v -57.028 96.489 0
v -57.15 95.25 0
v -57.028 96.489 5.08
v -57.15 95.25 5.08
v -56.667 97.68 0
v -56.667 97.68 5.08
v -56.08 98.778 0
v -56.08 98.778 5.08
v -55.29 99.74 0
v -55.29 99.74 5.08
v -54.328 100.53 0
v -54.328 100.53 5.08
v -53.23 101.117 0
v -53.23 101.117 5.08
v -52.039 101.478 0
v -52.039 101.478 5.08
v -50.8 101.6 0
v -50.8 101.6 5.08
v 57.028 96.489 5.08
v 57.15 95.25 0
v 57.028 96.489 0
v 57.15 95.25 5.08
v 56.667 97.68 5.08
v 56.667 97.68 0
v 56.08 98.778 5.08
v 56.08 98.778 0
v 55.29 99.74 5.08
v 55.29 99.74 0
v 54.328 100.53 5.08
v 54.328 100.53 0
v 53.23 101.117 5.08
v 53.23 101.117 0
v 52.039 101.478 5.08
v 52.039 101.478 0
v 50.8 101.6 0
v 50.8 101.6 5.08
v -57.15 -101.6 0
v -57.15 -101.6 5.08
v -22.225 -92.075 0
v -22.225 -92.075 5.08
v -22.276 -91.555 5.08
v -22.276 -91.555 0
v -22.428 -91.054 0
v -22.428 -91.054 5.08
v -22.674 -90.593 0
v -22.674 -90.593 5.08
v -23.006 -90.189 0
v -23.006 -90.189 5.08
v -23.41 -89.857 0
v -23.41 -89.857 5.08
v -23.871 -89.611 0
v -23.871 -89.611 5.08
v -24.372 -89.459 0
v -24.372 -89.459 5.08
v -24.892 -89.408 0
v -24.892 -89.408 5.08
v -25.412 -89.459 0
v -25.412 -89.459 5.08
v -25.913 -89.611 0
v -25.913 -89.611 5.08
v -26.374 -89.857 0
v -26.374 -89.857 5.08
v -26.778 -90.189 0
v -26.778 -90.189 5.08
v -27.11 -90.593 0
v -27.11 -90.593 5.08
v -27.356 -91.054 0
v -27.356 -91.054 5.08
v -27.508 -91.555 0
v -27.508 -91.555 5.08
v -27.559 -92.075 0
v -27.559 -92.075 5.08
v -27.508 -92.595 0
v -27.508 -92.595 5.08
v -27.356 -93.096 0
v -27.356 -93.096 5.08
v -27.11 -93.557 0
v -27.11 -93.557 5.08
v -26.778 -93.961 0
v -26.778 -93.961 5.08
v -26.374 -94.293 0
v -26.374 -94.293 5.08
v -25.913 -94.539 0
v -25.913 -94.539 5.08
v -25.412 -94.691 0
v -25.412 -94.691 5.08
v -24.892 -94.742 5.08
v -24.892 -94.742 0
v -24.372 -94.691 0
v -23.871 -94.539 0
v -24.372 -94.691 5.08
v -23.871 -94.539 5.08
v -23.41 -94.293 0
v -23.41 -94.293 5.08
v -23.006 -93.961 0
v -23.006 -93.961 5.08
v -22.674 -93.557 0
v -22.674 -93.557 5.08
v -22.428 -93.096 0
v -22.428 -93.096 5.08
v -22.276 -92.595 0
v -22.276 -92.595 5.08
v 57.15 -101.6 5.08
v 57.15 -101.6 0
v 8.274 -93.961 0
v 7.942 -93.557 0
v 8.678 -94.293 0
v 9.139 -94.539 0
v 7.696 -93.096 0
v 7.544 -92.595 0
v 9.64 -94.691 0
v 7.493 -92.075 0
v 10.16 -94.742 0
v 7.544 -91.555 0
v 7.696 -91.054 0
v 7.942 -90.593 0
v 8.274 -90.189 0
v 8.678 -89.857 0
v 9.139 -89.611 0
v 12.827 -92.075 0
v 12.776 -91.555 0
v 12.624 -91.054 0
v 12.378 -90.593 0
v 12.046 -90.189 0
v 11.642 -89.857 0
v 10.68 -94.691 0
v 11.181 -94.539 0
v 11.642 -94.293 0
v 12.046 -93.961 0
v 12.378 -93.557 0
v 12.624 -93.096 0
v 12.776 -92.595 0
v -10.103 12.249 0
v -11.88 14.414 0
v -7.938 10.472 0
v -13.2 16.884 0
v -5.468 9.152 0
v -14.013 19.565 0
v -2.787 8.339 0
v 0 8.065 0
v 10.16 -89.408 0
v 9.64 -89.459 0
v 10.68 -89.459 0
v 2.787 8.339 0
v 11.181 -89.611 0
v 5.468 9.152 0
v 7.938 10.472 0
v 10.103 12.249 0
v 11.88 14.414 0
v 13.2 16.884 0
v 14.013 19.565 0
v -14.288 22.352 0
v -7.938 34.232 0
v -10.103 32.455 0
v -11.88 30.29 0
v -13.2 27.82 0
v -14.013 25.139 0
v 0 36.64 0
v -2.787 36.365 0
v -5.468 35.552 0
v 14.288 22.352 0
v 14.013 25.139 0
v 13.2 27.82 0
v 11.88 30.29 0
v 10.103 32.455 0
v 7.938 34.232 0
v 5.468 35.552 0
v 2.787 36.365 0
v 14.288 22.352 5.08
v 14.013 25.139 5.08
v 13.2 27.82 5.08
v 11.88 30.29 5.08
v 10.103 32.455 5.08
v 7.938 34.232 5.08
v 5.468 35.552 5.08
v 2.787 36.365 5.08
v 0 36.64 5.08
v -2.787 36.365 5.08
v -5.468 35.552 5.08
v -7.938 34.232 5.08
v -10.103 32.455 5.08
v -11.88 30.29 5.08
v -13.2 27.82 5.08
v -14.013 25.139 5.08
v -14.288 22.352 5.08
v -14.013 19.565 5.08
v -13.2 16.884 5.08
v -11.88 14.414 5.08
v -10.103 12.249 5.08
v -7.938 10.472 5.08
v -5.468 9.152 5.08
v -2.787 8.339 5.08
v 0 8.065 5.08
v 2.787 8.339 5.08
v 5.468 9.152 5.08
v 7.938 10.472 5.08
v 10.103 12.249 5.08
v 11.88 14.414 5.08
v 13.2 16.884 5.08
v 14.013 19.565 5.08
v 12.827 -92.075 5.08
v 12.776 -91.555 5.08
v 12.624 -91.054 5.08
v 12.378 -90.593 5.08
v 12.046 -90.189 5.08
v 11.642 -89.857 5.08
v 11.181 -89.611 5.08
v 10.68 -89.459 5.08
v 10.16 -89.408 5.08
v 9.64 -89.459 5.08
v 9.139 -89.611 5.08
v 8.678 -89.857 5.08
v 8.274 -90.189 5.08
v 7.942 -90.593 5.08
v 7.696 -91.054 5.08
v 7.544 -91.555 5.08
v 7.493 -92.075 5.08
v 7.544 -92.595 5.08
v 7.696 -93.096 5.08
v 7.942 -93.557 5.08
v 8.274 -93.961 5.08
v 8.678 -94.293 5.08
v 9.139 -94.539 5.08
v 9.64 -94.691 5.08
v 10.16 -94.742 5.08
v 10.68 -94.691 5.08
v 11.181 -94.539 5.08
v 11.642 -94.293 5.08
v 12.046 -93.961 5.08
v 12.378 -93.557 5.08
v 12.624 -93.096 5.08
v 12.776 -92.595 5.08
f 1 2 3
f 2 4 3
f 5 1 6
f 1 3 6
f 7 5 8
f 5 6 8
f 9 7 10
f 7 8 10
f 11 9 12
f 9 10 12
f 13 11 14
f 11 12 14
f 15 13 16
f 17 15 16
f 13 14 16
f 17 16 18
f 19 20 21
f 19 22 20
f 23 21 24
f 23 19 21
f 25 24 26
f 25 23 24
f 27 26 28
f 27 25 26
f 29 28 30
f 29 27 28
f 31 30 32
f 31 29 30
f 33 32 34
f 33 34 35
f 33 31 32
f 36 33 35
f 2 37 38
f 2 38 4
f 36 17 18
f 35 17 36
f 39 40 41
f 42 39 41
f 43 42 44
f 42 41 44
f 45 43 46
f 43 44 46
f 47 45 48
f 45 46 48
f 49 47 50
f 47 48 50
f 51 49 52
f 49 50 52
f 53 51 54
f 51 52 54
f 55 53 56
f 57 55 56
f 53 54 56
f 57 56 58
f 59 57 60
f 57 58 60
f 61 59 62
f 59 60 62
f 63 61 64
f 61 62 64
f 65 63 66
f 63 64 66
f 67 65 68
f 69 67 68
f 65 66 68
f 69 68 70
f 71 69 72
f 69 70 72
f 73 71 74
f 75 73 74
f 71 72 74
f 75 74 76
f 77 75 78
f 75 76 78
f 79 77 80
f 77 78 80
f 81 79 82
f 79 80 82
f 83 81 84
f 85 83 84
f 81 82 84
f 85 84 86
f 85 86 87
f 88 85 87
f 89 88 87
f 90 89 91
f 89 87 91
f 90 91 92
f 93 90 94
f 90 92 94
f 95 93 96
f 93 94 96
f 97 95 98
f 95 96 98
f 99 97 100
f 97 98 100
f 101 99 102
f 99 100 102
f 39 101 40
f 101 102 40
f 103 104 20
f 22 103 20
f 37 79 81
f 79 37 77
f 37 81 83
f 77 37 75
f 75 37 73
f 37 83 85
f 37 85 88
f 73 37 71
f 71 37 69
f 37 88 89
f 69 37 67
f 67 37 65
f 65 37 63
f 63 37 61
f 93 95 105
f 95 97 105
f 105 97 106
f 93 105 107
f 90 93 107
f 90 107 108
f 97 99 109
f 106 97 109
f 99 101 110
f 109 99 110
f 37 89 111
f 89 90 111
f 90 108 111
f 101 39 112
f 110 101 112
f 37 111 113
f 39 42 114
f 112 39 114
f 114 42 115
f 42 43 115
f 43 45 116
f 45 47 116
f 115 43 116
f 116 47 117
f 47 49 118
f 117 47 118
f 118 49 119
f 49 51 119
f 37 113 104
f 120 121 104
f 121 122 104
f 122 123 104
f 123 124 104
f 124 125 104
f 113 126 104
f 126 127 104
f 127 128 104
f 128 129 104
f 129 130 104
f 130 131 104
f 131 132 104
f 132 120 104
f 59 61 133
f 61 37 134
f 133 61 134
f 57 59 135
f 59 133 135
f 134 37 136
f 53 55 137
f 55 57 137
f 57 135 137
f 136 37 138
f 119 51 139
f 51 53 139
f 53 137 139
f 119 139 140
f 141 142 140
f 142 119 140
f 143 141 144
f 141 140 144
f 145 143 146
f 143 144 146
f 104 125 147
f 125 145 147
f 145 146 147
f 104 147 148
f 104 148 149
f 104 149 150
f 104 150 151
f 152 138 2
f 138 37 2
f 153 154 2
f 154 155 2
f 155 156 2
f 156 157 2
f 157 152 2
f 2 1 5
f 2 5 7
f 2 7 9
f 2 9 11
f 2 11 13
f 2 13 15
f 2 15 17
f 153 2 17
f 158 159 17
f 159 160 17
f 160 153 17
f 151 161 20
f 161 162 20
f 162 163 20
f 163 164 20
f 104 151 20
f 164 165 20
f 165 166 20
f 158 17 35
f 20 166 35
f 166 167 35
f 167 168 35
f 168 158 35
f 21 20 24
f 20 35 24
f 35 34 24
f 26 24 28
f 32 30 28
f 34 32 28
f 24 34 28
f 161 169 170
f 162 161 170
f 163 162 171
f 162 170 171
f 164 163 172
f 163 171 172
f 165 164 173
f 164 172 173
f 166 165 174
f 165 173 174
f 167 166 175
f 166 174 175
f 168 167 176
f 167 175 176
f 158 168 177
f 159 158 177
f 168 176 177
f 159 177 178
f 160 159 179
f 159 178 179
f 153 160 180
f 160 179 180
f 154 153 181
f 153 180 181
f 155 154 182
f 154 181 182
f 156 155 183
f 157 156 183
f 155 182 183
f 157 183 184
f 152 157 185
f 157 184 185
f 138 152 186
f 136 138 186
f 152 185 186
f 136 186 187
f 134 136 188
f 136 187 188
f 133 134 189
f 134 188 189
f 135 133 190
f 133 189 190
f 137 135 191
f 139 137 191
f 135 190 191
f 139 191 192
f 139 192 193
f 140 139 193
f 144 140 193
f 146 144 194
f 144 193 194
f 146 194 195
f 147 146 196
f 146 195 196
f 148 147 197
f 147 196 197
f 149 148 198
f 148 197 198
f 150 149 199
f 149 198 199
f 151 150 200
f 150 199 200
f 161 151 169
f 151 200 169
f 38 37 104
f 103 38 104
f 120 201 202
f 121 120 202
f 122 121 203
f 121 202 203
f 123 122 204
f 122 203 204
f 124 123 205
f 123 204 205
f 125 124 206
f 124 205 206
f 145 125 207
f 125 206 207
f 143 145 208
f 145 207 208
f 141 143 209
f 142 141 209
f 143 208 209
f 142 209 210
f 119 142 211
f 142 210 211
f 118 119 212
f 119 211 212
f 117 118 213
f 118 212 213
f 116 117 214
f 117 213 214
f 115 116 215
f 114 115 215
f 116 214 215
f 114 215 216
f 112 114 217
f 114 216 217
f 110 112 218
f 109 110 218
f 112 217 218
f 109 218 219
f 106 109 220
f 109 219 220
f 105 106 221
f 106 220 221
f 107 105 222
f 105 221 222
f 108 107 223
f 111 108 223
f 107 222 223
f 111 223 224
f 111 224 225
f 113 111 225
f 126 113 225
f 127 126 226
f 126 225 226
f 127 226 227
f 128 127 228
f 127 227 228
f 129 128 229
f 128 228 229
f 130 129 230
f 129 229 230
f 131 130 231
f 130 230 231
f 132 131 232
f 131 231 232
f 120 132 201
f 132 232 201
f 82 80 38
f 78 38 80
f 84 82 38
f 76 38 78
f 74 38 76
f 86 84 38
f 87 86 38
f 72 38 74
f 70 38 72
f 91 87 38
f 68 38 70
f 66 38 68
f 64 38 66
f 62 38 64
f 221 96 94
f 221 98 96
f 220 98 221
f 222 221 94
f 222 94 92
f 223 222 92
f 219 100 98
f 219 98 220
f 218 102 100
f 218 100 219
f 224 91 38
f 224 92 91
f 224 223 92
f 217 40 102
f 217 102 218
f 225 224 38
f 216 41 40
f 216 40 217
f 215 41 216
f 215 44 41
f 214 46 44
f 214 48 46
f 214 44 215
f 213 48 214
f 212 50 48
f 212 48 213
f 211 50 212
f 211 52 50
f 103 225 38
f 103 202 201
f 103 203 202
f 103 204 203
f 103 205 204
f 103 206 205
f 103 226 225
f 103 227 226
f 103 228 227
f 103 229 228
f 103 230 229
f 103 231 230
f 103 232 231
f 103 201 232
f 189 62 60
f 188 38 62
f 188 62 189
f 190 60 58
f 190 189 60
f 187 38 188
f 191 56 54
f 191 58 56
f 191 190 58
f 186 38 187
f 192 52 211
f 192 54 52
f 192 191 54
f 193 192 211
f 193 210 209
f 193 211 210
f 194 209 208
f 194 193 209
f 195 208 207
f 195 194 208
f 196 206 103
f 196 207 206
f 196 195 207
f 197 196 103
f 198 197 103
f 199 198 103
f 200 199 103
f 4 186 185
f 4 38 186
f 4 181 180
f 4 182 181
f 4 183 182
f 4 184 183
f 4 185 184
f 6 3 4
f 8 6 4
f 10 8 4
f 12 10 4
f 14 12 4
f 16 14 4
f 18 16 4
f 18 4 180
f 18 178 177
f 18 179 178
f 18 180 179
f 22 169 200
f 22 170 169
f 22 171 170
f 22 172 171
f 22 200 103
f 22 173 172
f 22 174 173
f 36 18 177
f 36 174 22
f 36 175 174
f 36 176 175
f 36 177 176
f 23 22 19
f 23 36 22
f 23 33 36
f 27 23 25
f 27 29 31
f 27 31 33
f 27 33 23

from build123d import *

# Parameters (mm, degrees)
SKETCH1_W           = 114.3
SKETCH1_H           = 203.2
BOSS_EXTRUDE1_DEPTH = 5.08
FILLET1_R           = 6.35
SKETCH3_R           = 14.2875
CUT_EXTRUDE1_DEPTH  = 5.08
SKETCH4_R           = 2.667
CUT_EXTRUDE2_DEPTH  = 5.08


with BuildPart() as part:
    # Sketch1 → Boss-Extrude1 (new body)
    with BuildSketch(Plane.XY):
        Rectangle(SKETCH1_W, SKETCH1_H)
    extrude(amount=BOSS_EXTRUDE1_DEPTH)

    # Fillet1
    fillet1_edges = [part.edges().sort_by_distance(p)[0] for p in [
        (-57.15, 101.6, 2.54),
        (57.15, 101.6, 2.54),
    ]]
    fillet(fillet1_edges, radius=FILLET1_R)

    # Sketch3 → Cut-Extrude1 (cut)
    with BuildSketch(Plane.XY.offset(5.08)):
        with Locations((0, 22.352)):
            Circle(SKETCH3_R)
    extrude(amount=-CUT_EXTRUDE1_DEPTH, mode=Mode.SUBTRACT)

    # Sketch4 → Cut-Extrude2 (cut)
    with BuildSketch(Plane.XY.offset(5.08)):
        with Locations((10.16, -92.075)):
            Circle(SKETCH4_R)
        with Locations((-24.892, -92.075)):
            Circle(SKETCH4_R)
    extrude(amount=-CUT_EXTRUDE2_DEPTH, mode=Mode.SUBTRACT)


solid = part.part
